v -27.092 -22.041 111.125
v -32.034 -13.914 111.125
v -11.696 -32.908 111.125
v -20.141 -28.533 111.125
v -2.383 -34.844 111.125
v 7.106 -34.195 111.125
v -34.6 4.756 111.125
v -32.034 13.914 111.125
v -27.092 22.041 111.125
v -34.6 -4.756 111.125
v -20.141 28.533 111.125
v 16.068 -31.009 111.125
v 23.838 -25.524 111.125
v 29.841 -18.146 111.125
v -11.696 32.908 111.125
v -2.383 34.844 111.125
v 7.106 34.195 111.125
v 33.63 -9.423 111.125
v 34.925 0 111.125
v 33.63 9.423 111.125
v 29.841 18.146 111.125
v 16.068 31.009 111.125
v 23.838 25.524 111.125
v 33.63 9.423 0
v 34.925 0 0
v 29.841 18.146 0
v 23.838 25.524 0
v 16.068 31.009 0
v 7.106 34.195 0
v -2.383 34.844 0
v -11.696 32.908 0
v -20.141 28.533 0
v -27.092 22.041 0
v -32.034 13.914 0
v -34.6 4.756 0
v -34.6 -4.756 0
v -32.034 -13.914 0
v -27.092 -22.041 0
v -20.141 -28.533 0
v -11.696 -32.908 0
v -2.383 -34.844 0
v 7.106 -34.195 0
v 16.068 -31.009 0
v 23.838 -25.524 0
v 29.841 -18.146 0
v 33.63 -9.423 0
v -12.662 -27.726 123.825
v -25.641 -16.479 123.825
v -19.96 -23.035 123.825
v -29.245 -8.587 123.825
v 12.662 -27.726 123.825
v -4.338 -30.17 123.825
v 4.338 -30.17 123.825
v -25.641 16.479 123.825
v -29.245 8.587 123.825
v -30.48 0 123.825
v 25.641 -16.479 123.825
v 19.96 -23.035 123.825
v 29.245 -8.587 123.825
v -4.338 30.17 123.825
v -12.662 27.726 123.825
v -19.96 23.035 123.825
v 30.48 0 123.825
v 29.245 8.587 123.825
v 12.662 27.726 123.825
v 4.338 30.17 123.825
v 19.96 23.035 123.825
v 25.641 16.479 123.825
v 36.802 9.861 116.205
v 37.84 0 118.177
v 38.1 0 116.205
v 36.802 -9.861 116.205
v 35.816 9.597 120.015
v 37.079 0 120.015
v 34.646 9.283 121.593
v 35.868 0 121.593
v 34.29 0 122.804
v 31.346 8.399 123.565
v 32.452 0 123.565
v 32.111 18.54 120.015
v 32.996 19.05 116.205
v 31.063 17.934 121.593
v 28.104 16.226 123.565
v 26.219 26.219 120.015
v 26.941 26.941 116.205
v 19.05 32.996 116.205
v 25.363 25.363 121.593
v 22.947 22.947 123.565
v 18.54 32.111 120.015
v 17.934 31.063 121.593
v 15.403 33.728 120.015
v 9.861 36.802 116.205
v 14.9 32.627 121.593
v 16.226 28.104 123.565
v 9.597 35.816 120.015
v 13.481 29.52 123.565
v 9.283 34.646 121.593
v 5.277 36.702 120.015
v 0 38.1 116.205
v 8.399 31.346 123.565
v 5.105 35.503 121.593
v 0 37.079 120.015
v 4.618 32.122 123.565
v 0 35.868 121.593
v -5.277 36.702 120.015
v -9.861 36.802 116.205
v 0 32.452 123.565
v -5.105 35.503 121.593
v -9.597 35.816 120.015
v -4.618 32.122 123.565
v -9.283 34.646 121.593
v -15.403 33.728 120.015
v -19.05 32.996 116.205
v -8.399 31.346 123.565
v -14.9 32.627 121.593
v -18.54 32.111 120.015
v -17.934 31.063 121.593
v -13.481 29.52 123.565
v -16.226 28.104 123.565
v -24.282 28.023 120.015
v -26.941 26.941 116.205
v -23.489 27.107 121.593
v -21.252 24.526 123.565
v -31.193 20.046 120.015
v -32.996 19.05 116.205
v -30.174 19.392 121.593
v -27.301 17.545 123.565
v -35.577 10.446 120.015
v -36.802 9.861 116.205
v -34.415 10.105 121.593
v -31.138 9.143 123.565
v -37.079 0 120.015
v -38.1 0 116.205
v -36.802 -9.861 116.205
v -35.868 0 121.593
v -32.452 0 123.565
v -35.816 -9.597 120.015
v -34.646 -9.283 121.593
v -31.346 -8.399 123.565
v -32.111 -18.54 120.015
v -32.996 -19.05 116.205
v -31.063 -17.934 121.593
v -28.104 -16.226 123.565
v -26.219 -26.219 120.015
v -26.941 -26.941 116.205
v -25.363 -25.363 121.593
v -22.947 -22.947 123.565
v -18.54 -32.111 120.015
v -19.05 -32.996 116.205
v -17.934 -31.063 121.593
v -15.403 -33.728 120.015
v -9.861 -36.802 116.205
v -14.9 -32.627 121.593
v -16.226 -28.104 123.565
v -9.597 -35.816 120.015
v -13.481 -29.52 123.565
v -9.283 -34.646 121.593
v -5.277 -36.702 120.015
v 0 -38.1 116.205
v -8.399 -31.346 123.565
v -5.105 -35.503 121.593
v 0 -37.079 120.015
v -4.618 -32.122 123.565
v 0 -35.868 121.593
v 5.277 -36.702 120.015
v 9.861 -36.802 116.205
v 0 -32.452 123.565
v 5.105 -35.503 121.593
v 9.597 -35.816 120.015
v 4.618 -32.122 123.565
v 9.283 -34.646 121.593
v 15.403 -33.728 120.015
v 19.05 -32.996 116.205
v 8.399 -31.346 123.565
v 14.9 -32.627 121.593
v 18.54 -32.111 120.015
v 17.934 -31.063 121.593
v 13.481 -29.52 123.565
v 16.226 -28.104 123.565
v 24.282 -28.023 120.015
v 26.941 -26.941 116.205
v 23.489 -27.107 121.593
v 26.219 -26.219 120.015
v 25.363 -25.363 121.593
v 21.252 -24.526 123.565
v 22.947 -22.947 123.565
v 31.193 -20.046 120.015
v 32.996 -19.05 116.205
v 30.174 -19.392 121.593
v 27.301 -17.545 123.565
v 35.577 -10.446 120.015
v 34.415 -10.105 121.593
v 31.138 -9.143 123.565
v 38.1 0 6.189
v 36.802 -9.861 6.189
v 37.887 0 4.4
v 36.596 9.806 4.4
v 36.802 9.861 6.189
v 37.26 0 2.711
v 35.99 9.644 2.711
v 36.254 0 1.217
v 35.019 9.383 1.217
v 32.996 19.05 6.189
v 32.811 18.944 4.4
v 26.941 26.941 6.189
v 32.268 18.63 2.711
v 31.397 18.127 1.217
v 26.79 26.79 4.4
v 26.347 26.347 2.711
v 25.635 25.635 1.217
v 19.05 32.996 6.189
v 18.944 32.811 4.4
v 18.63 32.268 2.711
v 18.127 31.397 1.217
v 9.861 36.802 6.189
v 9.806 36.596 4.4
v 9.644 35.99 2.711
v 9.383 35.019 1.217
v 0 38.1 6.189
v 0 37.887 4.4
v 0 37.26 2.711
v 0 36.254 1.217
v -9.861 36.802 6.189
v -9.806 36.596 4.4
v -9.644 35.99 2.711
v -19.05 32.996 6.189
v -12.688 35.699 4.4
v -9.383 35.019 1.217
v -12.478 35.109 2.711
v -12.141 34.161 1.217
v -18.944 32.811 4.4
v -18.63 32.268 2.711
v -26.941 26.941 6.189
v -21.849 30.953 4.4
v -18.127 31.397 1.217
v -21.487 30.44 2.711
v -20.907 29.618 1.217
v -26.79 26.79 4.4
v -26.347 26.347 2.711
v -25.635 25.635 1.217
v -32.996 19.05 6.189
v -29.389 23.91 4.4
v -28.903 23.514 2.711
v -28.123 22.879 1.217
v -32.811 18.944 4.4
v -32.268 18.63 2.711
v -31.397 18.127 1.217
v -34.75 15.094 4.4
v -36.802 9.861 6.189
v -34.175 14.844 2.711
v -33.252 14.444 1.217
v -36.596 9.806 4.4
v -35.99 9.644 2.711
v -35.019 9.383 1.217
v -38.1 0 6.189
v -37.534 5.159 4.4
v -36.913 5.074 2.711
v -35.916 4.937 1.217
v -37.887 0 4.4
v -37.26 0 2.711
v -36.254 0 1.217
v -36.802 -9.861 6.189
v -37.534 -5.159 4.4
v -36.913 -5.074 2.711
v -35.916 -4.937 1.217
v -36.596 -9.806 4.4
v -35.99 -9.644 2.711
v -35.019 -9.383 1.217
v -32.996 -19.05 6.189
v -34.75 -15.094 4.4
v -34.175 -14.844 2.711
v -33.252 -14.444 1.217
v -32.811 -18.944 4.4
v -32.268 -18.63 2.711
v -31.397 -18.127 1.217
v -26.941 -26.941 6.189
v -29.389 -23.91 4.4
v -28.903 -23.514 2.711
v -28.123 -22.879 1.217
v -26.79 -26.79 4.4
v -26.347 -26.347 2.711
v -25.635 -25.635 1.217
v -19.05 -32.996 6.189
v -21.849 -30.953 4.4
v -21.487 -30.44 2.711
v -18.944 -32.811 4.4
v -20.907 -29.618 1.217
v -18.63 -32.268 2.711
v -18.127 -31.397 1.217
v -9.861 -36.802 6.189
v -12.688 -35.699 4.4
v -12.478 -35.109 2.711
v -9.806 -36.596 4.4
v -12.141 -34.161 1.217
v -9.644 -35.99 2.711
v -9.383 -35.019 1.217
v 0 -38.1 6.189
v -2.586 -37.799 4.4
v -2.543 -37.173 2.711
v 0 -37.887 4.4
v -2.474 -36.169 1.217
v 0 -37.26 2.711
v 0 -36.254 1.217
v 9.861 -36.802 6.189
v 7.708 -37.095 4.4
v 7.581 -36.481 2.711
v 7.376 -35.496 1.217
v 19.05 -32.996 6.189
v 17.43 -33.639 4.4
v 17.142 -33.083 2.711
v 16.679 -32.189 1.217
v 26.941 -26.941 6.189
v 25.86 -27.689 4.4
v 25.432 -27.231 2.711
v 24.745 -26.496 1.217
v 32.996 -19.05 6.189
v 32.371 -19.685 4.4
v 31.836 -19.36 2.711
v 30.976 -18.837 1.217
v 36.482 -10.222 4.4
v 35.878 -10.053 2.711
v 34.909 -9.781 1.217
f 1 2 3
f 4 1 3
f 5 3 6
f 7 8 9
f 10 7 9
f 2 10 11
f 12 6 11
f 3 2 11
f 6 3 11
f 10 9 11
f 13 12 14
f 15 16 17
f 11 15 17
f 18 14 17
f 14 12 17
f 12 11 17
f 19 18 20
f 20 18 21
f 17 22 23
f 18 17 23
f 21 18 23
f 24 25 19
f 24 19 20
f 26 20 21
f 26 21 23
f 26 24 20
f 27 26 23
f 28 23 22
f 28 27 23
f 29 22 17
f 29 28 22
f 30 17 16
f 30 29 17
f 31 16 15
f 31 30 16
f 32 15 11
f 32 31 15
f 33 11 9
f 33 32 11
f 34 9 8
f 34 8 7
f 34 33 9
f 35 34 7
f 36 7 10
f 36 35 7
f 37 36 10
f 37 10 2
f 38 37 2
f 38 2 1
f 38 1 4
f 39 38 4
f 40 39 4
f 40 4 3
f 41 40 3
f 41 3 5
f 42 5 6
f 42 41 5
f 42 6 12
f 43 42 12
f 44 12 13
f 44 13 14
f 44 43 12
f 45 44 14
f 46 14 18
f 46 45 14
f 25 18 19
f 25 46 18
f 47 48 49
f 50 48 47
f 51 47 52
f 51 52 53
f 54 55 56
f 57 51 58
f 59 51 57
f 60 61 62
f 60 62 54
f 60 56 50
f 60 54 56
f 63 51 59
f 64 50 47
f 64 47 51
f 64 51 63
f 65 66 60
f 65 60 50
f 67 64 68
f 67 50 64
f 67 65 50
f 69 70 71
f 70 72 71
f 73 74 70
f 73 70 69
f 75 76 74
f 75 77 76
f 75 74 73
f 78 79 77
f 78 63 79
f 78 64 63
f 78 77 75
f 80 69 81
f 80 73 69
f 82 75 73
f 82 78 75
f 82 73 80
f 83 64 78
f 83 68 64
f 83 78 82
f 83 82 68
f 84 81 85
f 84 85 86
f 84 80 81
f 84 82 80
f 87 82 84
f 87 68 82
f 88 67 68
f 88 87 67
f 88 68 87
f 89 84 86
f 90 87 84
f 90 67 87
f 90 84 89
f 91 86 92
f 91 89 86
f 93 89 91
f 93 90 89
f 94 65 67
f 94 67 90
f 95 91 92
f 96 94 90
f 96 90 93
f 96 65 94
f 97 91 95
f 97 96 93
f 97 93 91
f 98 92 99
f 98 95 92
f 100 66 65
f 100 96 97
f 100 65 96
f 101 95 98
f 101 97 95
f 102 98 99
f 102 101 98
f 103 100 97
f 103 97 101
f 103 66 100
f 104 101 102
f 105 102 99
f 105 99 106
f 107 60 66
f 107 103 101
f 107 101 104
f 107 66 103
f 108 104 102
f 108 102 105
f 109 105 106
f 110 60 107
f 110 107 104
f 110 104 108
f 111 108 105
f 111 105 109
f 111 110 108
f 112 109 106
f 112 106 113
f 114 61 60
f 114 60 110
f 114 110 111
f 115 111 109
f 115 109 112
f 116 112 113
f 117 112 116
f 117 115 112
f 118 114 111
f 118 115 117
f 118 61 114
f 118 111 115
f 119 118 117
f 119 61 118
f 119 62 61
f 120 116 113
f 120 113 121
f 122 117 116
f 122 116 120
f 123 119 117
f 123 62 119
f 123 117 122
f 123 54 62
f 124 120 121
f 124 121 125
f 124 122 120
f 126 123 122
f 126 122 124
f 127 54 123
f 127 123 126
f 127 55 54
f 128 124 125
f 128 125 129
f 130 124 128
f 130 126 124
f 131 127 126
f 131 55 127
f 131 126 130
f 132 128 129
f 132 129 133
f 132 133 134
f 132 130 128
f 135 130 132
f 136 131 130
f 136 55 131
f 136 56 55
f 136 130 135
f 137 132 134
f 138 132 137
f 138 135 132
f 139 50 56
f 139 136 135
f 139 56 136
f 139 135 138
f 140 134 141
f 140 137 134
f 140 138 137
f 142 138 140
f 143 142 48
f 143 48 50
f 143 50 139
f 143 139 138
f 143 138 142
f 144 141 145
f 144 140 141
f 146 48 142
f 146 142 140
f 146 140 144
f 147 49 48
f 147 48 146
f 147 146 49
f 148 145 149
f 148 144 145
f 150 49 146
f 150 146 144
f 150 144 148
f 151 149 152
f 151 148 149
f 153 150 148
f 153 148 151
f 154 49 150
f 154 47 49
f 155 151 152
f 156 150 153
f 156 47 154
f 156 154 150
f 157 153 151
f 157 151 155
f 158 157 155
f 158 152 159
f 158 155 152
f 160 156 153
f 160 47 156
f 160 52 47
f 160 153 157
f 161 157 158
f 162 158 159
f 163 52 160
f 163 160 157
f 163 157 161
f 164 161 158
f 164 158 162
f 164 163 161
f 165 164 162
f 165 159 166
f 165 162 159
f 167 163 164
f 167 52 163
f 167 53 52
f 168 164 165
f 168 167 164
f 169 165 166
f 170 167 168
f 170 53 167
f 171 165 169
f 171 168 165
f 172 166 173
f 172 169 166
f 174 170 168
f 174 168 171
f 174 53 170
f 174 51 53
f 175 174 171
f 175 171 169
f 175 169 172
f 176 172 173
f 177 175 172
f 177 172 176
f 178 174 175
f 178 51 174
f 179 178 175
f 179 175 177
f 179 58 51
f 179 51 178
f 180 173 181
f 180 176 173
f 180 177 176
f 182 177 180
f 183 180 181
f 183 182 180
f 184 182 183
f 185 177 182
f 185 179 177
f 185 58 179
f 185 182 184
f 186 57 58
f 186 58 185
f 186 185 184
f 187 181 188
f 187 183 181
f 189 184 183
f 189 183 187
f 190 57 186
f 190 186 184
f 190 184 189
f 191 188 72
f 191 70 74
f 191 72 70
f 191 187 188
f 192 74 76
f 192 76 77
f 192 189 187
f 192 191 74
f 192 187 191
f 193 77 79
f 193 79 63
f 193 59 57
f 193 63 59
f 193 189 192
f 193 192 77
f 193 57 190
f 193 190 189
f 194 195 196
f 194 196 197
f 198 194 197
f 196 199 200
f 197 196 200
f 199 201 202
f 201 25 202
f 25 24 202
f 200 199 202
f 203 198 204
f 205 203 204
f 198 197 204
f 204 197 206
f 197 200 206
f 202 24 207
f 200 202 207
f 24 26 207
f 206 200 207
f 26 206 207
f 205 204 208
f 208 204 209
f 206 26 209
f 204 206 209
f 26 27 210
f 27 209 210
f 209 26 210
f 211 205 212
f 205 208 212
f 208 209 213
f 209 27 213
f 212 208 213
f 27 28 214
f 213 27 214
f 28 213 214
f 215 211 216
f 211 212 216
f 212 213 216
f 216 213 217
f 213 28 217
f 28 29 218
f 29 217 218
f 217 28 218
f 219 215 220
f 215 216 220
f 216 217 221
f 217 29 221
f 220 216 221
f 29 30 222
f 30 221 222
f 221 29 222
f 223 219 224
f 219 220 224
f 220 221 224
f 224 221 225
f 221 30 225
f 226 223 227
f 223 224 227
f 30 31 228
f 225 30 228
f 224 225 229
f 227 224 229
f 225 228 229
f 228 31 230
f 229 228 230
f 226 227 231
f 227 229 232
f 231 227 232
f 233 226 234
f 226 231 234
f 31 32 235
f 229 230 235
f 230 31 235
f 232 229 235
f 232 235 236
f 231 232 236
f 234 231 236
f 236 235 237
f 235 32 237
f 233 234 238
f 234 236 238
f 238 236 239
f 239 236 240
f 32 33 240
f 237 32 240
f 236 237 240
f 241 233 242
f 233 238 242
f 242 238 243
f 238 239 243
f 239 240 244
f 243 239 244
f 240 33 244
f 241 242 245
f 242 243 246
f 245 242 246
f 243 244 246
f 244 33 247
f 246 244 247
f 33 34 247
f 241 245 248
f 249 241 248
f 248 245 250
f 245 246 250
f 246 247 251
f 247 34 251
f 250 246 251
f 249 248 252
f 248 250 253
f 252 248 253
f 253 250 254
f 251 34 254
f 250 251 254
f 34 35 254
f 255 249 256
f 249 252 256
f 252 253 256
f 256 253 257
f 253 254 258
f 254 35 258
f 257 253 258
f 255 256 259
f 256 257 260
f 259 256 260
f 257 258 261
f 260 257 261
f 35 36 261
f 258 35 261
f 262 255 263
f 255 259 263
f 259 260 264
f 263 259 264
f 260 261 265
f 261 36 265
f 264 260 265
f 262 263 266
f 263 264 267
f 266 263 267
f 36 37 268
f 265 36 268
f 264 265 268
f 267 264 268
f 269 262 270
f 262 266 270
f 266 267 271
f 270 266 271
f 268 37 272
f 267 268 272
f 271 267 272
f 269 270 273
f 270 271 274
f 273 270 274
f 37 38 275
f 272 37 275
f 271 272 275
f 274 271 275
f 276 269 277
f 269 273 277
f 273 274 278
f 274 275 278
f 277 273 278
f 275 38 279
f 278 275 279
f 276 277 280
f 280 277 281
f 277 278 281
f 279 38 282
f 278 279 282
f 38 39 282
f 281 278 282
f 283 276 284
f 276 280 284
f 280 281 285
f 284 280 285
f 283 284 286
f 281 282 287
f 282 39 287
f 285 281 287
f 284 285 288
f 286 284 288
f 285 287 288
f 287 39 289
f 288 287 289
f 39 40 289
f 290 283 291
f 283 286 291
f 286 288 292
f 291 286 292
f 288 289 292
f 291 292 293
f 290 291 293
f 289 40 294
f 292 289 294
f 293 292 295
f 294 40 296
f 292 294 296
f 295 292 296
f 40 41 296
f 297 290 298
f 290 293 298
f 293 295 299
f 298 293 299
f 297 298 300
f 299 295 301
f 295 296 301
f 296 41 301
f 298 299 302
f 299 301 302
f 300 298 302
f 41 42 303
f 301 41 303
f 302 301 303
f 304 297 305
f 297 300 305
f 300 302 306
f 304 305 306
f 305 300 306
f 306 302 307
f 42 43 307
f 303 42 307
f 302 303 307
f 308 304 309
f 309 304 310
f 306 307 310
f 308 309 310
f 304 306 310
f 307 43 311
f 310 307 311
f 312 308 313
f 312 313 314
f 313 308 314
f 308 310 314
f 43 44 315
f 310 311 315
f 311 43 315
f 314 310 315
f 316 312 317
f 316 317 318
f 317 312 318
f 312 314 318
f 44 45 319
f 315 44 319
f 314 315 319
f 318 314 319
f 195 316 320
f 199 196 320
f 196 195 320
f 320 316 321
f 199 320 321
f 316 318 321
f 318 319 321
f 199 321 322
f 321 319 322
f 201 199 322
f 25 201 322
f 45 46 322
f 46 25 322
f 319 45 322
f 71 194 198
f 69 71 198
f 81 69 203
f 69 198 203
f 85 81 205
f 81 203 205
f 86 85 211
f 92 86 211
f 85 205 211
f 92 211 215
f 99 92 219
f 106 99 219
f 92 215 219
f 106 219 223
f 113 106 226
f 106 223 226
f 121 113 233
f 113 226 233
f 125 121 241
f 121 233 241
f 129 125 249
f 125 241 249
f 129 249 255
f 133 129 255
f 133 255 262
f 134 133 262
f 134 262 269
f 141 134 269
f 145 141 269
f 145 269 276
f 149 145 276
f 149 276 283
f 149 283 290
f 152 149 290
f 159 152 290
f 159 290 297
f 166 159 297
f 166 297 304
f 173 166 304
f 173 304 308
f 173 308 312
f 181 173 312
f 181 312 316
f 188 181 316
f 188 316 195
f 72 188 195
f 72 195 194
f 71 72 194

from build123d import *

# Parameters (mm, degrees)
F0_R     = 38.1
F1_DEPTH = 123.825
F2_R     = 34.925
F3_DEPTH = 111.125
F5_R     = 7.62


# Not quite as in the source:
# - a fillet or chamfer that OpenCascade refuses, or shapes differently, is made with other operations: its cross-section is extruded or revolved along the edge and cut away or added


with BuildPart() as f1:
    # F0 (on Top) → F1 (new body)
    with BuildSketch(Plane.XY):
        Circle(F0_R)
    extrude(amount=F1_DEPTH)

    # F2 (on Top) → F3 (cut)
    with BuildSketch(Plane.XY):
        Circle(F2_R)
    extrude(amount=F3_DEPTH, mode=Mode.SUBTRACT)

    # F4: fillet of radius 7.62 on 1 edges, made by hand

    # F4_s1 → F4_t2 (revolve, cut)
    with BuildSketch(Plane.XZ):
        with BuildLine():
            ThreePointArc((38.1, 6.189214409), (37.25994469, 2.7111761688), (34.925, 0))
            Line((34.925, 0), (38.1, 0))
            Line((38.1, 0), (38.1, 6.189214409))
        make_face()
    revolve(axis=Axis((0, 0, 0), (0, 0, 1)), mode=Mode.SUBTRACT)

    # F5
    f5_edges = [f1.edges().sort_by_distance(p)[0] for p in [
        (-38.1, 0, 123.825),
    ]]
    fillet(f5_edges, radius=F5_R)


solid = f1.part
